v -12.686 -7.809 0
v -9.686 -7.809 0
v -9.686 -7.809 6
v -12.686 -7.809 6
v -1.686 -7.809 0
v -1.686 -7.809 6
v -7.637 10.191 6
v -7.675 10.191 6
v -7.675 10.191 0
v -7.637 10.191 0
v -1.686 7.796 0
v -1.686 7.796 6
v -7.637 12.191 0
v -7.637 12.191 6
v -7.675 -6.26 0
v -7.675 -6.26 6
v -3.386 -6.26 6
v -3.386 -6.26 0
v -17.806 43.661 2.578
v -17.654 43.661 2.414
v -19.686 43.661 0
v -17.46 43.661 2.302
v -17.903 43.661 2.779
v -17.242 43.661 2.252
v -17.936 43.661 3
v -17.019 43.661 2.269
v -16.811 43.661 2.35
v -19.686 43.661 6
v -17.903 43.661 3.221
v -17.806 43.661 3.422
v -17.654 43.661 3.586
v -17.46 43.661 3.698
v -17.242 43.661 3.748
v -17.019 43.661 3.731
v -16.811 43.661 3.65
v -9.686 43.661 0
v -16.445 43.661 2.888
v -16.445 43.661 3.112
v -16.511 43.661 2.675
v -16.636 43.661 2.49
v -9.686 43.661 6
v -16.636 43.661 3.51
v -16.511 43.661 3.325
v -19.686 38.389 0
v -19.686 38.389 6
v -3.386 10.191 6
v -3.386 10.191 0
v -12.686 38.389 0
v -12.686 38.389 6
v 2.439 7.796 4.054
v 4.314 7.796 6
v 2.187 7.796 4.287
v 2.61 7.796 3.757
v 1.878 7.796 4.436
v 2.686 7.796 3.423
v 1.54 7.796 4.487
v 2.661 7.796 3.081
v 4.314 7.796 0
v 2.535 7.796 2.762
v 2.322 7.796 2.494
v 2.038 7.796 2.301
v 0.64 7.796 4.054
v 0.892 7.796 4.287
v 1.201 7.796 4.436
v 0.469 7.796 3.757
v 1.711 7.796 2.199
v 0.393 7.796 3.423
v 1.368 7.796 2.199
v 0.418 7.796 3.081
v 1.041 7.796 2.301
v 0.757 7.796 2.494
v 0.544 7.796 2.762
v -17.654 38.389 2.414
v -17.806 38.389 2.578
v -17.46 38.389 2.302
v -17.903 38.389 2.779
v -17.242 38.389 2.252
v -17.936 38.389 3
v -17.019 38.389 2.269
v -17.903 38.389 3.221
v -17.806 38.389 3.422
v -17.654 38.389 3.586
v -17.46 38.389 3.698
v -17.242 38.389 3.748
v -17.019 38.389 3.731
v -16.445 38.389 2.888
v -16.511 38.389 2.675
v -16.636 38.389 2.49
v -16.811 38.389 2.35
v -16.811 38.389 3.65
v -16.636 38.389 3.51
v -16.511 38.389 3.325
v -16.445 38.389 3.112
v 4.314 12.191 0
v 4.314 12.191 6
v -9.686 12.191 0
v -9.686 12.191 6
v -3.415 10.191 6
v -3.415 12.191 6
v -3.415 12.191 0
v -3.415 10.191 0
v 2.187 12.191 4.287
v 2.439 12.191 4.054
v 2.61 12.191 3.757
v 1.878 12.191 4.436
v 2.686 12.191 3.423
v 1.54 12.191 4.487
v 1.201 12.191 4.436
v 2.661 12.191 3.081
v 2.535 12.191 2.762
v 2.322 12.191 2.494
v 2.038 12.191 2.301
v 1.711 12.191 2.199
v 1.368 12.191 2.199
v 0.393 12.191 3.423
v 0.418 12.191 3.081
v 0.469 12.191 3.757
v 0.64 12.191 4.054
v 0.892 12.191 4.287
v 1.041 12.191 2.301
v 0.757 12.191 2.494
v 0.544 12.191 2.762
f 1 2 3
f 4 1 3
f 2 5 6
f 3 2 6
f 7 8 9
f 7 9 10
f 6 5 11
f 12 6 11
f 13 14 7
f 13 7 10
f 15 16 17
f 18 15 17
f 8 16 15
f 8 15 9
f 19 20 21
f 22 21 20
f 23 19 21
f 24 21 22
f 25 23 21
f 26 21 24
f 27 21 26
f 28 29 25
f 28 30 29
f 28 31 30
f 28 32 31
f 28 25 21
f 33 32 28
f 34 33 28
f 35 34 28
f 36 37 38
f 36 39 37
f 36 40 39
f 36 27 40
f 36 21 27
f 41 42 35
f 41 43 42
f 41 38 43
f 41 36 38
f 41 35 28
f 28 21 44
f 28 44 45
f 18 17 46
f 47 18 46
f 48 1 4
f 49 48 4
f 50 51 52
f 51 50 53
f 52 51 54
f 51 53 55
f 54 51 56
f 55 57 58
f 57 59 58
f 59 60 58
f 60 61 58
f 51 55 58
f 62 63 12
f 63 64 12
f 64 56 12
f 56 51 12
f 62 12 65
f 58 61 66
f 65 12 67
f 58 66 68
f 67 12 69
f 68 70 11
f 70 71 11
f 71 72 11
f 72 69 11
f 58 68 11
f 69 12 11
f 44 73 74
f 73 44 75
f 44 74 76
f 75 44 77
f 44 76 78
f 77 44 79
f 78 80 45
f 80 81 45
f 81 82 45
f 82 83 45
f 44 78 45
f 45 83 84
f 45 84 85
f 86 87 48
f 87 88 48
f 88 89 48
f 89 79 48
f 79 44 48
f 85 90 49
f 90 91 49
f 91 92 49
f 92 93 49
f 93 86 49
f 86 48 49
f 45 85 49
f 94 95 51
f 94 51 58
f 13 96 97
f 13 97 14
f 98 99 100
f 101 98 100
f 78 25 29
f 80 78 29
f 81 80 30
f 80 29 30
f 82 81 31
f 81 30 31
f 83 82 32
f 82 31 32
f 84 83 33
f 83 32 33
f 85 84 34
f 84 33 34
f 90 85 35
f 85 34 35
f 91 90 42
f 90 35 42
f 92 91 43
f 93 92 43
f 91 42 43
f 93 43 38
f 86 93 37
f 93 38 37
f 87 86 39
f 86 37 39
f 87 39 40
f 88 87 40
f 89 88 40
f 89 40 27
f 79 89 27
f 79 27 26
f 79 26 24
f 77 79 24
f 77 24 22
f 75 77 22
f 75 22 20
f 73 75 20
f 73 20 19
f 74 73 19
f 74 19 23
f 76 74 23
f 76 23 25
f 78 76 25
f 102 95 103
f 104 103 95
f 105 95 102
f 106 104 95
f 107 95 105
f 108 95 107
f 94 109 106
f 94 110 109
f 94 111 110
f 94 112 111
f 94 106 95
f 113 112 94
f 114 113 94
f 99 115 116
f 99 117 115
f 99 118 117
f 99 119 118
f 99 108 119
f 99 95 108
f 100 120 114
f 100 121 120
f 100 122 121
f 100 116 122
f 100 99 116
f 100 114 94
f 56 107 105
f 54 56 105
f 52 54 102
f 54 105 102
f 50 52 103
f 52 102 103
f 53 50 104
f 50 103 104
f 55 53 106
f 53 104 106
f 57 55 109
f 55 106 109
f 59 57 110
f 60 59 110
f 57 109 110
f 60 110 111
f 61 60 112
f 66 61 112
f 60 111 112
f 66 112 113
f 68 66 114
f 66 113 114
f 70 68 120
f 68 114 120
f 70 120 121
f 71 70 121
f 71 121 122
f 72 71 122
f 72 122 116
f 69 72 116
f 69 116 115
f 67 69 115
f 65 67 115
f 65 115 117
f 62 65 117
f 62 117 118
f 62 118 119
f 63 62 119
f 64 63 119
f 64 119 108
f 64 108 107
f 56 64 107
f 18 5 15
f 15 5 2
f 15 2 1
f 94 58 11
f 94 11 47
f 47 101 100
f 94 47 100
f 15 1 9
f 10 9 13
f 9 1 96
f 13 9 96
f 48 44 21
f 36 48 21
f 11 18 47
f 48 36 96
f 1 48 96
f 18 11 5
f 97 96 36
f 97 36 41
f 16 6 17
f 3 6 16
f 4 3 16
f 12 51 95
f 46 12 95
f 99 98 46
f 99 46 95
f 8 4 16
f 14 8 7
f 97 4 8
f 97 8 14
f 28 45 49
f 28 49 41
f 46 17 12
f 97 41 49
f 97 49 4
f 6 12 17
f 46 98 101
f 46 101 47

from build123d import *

# Parameters (mm, degrees)
SKETCH1_W           = 8
SKETCH1_H           = 20
BOSS_EXTRUDE1_DEPTH = 6
SKETCH2_W           = 4.289164283
SKETCH2_H           = 16.451556892
CUT_EXTRUDE1_DEPTH  = 10
CUT_EXTRUDE2_REACH  = 25.018
SKETCH3_W           = 4.222549804
SKETCH3_H           = 6
SKETCH4_W           = 6
SKETCH4_H           = 4.395289814
BOSS_EXTRUDE2_DEPTH = 3
SKETCH5_W           = 6
SKETCH5_H           = 51.469682585
BOSS_EXTRUDE3_DEPTH = 3
SKETCH6_W           = 6
SKETCH6_H           = 5.271956477
BOSS_EXTRUDE4_DEPTH = 7
SKETCH8_R           = 0.75
CUT_EXTRUDE3_DEPTH  = 56.431741569
SKETCH9_W           = 6
SKETCH9_H           = 4.395289814
BOSS_EXTRUDE5_DEPTH = 3
SKETCH10_R          = 1.15
CUT_EXTRUDE4_DEPTH  = 38.601737593


with BuildPart() as part:
    # Sketch1 → Boss-Extrude1 (new body)
    with BuildSketch(Plane.XY):
        with Locations((-5.686283245, 2.191356499)):
            Rectangle(SKETCH1_W, SKETCH1_H)
    extrude(amount=BOSS_EXTRUDE1_DEPTH)

    # Sketch2 → Cut-Extrude1 (cut)
    with BuildSketch(Plane.XY.offset(6)):
        with Locations((-5.530865387, 1.965578053)):
            Rectangle(SKETCH2_W, SKETCH2_H)
    extrude(amount=-CUT_EXTRUDE1_DEPTH, mode=Mode.SUBTRACT)

    # Sketch3 → Cut-Extrude2 (cut, up to next)
    with BuildSketch(Plane(origin=(0, 12.191356499, 0), x_dir=(1, 0, 0), z_dir=(0, 1, 0)), mode=Mode.PRIVATE) as cut_extrude2_sk1:
        with Locations((-5.525800627, -3)):
            Rectangle(SKETCH3_W, SKETCH3_H)
    cut_extrude2_tool1 = extrude(cut_extrude2_sk1.sketch, amount=-CUT_EXTRUDE2_REACH, mode=Mode.PRIVATE) & part.part
    add(cut_extrude2_tool1.solids().sort_by_distance((-5.525801, 12.191356, 3))[0], mode=Mode.SUBTRACT)

    # Sketch4 → Boss-Extrude2 (add)
    with BuildSketch(Plane(origin=(-1.686283245, 0, 0), x_dir=(0, 0, -1), z_dir=(1, 0, 0))):
        with Locations((-3, 9.993711592)):
            Rectangle(SKETCH4_W, SKETCH4_H)
    extrude(amount=BOSS_EXTRUDE2_DEPTH)

    # Sketch5 → Boss-Extrude3 (add)
    with BuildSketch(Plane.ZY.offset(9.686283245)):
        with Locations((3, 17.926197792)):
            Rectangle(SKETCH5_W, SKETCH5_H)
    extrude(amount=BOSS_EXTRUDE3_DEPTH)

    # Sketch6 → Boss-Extrude4 (add)
    with BuildSketch(Plane.ZY.offset(12.686283245)):
        with Locations((3, 41.025060846)):
            Rectangle(SKETCH6_W, SKETCH6_H)
    extrude(amount=BOSS_EXTRUDE4_DEPTH)

    # Sketch8 → Cut-Extrude3 (cut, through all)
    with BuildSketch(Plane(origin=(0, 43.661039084, 0), x_dir=(1, 0, 0), z_dir=(0, 1, 0))):
        with Locations(Location((-17.186283245, -3, 0), (0, 0, 180))):
            Circle(SKETCH8_R)
    extrude(amount=-CUT_EXTRUDE3_DEPTH, mode=Mode.SUBTRACT)

    # Sketch9 → Boss-Extrude5 (add)
    with BuildSketch(Plane(origin=(1.313716755, 0, 0), x_dir=(0, 0, -1), z_dir=(1, 0, 0))):
        with Locations((-3, 9.993711592)):
            Rectangle(SKETCH9_W, SKETCH9_H)
    extrude(amount=BOSS_EXTRUDE5_DEPTH)

    # Sketch10 → Cut-Extrude4 (cut, through all)
    with BuildSketch(Plane(origin=(0, 12.191356499, 0), x_dir=(1, 0, 0), z_dir=(0, 1, 0))):
        with Locations(Location((1.539504185, -3.336651143, 0), (0, 0, 270))):
            Circle(SKETCH10_R)
    extrude(amount=-CUT_EXTRUDE4_DEPTH, mode=Mode.SUBTRACT)


solid = part.part
